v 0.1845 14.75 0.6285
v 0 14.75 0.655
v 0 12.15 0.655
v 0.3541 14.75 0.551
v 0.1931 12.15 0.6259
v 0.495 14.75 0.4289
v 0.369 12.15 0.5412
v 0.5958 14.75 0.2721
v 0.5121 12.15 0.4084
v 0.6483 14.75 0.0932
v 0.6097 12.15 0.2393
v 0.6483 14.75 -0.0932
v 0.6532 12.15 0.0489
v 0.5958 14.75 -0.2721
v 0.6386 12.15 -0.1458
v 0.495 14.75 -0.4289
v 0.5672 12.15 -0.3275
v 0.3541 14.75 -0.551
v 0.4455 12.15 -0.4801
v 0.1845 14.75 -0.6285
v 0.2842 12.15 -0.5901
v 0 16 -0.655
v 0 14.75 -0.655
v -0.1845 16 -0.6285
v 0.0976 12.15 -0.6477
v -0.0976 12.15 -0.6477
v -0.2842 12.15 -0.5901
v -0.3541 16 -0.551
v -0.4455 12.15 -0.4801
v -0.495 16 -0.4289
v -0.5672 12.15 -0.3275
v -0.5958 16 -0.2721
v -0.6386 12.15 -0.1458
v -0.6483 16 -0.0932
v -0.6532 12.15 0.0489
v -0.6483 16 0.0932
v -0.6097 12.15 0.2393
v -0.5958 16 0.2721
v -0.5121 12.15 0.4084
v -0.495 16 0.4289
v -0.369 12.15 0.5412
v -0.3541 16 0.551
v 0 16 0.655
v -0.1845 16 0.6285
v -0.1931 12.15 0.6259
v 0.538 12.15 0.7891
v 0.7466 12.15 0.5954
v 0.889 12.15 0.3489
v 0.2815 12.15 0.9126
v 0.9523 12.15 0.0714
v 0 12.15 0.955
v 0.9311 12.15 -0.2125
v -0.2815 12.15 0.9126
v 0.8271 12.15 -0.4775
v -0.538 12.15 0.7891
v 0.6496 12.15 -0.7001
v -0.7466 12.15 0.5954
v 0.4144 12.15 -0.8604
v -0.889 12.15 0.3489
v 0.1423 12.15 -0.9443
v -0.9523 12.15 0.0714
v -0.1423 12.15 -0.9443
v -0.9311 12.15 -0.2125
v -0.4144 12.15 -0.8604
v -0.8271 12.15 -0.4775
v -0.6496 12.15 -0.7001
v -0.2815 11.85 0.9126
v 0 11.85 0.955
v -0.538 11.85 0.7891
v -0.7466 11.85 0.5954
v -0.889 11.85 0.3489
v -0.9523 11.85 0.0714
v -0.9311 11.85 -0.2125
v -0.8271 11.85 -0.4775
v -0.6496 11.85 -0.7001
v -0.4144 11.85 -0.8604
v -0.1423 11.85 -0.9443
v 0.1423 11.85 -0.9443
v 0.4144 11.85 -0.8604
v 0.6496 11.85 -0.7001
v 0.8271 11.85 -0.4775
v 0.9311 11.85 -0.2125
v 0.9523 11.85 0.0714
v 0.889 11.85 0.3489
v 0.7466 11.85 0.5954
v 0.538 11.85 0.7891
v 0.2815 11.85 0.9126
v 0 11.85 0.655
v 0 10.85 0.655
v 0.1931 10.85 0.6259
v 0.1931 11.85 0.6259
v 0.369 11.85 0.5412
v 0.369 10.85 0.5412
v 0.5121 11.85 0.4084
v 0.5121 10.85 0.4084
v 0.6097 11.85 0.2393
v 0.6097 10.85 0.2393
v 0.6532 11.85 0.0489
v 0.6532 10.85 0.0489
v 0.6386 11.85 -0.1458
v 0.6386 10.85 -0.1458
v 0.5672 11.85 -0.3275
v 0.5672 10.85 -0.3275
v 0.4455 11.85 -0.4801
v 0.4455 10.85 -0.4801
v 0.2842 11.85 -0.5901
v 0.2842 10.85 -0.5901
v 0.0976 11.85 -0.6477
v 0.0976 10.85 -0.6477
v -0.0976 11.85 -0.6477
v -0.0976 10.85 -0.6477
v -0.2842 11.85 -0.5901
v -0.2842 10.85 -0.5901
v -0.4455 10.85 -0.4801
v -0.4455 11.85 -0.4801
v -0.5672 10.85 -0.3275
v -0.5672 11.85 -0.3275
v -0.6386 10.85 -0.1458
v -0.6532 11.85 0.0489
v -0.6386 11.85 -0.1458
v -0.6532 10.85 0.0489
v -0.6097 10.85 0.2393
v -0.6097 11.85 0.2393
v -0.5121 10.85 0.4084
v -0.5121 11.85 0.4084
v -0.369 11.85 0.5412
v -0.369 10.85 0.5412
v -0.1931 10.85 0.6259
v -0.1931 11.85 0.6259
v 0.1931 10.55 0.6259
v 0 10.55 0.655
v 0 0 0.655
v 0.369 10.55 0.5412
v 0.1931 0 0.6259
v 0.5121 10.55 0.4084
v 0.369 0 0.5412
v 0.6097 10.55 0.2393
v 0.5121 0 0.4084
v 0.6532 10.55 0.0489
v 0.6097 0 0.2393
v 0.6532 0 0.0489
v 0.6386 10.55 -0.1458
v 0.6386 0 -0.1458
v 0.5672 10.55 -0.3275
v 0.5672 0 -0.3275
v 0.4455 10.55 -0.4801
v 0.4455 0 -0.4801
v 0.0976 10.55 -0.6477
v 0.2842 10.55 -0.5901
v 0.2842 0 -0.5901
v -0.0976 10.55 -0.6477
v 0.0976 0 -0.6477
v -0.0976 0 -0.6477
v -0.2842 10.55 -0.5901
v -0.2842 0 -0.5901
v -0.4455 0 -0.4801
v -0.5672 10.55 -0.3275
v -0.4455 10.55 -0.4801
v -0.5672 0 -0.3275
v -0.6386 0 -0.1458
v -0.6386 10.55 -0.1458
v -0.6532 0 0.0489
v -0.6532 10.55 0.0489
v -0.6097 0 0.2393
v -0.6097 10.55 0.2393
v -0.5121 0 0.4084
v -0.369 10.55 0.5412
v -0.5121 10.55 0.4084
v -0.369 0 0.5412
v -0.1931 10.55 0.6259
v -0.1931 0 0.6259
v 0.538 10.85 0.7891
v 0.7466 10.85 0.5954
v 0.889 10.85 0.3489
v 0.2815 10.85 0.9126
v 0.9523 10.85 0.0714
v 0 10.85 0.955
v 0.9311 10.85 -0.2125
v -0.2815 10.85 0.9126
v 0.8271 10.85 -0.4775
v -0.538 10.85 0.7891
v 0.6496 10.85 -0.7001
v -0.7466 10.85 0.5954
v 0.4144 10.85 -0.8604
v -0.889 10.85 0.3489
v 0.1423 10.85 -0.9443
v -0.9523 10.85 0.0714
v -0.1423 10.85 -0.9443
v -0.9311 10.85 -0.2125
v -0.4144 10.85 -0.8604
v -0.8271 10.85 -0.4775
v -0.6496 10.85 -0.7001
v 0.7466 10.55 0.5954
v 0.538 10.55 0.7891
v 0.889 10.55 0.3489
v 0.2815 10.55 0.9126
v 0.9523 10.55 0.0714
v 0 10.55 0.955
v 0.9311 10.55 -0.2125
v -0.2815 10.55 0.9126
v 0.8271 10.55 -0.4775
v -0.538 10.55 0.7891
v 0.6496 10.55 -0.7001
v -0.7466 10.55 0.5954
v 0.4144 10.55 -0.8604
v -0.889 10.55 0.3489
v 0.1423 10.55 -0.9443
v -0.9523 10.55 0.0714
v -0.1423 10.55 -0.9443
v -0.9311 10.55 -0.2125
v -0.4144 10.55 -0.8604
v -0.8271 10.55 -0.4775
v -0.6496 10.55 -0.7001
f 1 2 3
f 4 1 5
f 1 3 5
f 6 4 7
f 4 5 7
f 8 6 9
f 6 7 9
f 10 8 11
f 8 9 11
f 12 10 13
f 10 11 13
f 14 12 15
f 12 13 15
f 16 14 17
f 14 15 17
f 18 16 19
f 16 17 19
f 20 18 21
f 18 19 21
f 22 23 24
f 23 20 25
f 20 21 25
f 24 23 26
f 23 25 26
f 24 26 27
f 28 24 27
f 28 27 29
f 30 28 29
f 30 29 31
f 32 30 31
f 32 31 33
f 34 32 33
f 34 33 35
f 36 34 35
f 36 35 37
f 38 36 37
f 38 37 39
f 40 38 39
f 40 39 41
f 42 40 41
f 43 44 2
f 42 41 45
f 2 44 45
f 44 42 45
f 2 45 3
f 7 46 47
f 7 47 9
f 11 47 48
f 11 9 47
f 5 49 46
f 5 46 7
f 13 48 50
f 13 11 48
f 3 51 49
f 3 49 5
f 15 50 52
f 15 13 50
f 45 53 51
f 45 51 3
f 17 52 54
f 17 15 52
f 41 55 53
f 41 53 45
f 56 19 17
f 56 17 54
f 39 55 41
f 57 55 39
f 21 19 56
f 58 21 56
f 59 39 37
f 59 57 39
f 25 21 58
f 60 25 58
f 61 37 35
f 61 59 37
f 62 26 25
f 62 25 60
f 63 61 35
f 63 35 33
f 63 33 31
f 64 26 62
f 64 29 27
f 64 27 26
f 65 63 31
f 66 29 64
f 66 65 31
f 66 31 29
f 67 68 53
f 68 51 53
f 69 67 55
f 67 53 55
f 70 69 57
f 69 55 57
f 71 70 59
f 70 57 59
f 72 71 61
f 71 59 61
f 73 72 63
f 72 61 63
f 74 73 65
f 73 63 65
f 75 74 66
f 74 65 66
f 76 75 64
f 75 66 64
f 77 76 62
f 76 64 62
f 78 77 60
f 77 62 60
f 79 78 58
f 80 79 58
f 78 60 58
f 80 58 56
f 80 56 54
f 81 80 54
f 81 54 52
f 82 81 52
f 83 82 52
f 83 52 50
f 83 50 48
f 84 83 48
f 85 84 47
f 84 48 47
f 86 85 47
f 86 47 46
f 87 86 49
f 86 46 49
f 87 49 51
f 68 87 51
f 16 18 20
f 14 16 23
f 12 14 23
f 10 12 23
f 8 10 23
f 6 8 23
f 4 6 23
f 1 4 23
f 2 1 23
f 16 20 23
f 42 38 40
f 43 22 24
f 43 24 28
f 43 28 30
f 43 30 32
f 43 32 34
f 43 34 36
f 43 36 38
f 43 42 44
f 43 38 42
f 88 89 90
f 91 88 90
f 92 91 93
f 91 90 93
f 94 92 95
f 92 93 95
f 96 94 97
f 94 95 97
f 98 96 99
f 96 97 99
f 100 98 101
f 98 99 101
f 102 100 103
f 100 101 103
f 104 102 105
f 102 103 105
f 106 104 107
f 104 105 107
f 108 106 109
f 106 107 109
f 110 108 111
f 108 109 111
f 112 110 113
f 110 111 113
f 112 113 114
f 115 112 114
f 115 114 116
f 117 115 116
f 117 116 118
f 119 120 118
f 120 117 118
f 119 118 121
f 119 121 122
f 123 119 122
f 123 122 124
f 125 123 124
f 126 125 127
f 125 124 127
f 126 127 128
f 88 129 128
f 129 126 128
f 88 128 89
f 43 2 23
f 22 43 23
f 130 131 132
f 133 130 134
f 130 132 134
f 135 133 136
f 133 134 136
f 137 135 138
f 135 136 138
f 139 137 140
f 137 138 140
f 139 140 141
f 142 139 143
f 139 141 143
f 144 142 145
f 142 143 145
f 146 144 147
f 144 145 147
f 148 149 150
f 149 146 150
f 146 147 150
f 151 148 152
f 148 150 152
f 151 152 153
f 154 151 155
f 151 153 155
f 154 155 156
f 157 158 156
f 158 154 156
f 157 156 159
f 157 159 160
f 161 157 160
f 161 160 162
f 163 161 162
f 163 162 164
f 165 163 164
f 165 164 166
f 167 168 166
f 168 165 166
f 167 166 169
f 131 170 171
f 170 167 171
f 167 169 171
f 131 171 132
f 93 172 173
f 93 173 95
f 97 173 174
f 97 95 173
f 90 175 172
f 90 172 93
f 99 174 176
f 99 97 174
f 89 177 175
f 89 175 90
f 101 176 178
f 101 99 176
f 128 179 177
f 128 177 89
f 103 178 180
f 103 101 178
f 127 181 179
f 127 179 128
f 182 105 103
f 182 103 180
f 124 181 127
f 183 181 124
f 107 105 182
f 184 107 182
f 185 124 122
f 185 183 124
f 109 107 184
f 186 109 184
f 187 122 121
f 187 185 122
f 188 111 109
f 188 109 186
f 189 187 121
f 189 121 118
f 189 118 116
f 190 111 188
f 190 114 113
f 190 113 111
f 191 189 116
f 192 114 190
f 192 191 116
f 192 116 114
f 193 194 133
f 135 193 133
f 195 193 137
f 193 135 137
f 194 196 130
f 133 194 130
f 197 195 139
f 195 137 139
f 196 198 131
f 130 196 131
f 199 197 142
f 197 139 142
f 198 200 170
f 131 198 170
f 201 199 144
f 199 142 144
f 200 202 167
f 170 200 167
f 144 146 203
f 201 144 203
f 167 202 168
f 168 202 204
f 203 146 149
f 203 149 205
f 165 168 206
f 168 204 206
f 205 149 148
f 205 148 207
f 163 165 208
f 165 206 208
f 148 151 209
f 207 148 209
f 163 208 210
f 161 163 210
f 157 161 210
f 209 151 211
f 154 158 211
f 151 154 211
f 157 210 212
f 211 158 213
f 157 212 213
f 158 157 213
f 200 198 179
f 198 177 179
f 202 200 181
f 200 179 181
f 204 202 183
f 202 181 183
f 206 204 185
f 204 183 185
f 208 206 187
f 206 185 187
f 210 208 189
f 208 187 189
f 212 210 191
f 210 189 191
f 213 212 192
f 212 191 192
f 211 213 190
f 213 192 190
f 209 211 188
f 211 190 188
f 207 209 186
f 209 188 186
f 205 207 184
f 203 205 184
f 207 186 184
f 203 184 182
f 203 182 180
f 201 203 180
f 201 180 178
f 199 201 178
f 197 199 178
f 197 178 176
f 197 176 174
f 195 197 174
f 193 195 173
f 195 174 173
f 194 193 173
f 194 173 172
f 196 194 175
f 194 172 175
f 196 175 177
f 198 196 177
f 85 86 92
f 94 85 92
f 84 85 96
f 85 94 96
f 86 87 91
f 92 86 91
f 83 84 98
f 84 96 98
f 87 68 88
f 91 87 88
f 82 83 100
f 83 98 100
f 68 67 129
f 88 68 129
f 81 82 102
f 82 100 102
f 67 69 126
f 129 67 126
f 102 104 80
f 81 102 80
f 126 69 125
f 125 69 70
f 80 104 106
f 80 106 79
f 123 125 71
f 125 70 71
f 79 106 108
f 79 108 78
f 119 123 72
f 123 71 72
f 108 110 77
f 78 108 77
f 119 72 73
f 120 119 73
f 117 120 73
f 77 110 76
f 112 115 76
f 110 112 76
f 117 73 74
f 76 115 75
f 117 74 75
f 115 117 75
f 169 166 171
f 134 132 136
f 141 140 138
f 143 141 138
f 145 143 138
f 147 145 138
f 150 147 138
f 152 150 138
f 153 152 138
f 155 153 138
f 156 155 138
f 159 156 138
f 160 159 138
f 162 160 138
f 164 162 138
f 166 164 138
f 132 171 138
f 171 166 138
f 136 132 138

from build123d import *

# Parameters (mm, degrees)
SKETCH1_R           = 0.655
BOSS_EXTRUDE1_DEPTH = 16
CUT_EXTRUDE1_START  = -1.25
CUT_EXTRUDE1_DEPTH  = 1.25
SKETCH3_W           = 0.6
SKETCH3_H           = 0.3


with BuildPart() as part:
    # Sketch1 → Boss-Extrude1 (new body)
    with BuildSketch(Plane(origin=(0, 0, 0), x_dir=(1, 0, 0), z_dir=(0, 1, 0))):
        Circle(SKETCH1_R)
    extrude(amount=BOSS_EXTRUDE1_DEPTH)

    # Sketch2 → Cut-Extrude1 (cut)
    with BuildSketch(Plane(origin=(0, 16, 0), x_dir=(1, 0, 0), z_dir=(0, 1, 0)).offset(CUT_EXTRUDE1_START)):
        with BuildLine():
            Line((0, -0.655), (0, 0.655))
            ThreePointArc((0, 0.655), (0.655, 0), (0, -0.655))
        make_face()
    extrude(amount=CUT_EXTRUDE1_DEPTH, mode=Mode.SUBTRACT)

    # Sketch3 → Revolve1 (revolve)
    with BuildSketch(Plane.XY):
        with Locations((0.655, 12)):
            Rectangle(SKETCH3_W, SKETCH3_H)
        with Locations((0.655, 10.7)):
            Rectangle(SKETCH3_W, SKETCH3_H)
    revolve(axis=Axis((0, 16, 0), (0, -1, 0)))


solid = part.part
